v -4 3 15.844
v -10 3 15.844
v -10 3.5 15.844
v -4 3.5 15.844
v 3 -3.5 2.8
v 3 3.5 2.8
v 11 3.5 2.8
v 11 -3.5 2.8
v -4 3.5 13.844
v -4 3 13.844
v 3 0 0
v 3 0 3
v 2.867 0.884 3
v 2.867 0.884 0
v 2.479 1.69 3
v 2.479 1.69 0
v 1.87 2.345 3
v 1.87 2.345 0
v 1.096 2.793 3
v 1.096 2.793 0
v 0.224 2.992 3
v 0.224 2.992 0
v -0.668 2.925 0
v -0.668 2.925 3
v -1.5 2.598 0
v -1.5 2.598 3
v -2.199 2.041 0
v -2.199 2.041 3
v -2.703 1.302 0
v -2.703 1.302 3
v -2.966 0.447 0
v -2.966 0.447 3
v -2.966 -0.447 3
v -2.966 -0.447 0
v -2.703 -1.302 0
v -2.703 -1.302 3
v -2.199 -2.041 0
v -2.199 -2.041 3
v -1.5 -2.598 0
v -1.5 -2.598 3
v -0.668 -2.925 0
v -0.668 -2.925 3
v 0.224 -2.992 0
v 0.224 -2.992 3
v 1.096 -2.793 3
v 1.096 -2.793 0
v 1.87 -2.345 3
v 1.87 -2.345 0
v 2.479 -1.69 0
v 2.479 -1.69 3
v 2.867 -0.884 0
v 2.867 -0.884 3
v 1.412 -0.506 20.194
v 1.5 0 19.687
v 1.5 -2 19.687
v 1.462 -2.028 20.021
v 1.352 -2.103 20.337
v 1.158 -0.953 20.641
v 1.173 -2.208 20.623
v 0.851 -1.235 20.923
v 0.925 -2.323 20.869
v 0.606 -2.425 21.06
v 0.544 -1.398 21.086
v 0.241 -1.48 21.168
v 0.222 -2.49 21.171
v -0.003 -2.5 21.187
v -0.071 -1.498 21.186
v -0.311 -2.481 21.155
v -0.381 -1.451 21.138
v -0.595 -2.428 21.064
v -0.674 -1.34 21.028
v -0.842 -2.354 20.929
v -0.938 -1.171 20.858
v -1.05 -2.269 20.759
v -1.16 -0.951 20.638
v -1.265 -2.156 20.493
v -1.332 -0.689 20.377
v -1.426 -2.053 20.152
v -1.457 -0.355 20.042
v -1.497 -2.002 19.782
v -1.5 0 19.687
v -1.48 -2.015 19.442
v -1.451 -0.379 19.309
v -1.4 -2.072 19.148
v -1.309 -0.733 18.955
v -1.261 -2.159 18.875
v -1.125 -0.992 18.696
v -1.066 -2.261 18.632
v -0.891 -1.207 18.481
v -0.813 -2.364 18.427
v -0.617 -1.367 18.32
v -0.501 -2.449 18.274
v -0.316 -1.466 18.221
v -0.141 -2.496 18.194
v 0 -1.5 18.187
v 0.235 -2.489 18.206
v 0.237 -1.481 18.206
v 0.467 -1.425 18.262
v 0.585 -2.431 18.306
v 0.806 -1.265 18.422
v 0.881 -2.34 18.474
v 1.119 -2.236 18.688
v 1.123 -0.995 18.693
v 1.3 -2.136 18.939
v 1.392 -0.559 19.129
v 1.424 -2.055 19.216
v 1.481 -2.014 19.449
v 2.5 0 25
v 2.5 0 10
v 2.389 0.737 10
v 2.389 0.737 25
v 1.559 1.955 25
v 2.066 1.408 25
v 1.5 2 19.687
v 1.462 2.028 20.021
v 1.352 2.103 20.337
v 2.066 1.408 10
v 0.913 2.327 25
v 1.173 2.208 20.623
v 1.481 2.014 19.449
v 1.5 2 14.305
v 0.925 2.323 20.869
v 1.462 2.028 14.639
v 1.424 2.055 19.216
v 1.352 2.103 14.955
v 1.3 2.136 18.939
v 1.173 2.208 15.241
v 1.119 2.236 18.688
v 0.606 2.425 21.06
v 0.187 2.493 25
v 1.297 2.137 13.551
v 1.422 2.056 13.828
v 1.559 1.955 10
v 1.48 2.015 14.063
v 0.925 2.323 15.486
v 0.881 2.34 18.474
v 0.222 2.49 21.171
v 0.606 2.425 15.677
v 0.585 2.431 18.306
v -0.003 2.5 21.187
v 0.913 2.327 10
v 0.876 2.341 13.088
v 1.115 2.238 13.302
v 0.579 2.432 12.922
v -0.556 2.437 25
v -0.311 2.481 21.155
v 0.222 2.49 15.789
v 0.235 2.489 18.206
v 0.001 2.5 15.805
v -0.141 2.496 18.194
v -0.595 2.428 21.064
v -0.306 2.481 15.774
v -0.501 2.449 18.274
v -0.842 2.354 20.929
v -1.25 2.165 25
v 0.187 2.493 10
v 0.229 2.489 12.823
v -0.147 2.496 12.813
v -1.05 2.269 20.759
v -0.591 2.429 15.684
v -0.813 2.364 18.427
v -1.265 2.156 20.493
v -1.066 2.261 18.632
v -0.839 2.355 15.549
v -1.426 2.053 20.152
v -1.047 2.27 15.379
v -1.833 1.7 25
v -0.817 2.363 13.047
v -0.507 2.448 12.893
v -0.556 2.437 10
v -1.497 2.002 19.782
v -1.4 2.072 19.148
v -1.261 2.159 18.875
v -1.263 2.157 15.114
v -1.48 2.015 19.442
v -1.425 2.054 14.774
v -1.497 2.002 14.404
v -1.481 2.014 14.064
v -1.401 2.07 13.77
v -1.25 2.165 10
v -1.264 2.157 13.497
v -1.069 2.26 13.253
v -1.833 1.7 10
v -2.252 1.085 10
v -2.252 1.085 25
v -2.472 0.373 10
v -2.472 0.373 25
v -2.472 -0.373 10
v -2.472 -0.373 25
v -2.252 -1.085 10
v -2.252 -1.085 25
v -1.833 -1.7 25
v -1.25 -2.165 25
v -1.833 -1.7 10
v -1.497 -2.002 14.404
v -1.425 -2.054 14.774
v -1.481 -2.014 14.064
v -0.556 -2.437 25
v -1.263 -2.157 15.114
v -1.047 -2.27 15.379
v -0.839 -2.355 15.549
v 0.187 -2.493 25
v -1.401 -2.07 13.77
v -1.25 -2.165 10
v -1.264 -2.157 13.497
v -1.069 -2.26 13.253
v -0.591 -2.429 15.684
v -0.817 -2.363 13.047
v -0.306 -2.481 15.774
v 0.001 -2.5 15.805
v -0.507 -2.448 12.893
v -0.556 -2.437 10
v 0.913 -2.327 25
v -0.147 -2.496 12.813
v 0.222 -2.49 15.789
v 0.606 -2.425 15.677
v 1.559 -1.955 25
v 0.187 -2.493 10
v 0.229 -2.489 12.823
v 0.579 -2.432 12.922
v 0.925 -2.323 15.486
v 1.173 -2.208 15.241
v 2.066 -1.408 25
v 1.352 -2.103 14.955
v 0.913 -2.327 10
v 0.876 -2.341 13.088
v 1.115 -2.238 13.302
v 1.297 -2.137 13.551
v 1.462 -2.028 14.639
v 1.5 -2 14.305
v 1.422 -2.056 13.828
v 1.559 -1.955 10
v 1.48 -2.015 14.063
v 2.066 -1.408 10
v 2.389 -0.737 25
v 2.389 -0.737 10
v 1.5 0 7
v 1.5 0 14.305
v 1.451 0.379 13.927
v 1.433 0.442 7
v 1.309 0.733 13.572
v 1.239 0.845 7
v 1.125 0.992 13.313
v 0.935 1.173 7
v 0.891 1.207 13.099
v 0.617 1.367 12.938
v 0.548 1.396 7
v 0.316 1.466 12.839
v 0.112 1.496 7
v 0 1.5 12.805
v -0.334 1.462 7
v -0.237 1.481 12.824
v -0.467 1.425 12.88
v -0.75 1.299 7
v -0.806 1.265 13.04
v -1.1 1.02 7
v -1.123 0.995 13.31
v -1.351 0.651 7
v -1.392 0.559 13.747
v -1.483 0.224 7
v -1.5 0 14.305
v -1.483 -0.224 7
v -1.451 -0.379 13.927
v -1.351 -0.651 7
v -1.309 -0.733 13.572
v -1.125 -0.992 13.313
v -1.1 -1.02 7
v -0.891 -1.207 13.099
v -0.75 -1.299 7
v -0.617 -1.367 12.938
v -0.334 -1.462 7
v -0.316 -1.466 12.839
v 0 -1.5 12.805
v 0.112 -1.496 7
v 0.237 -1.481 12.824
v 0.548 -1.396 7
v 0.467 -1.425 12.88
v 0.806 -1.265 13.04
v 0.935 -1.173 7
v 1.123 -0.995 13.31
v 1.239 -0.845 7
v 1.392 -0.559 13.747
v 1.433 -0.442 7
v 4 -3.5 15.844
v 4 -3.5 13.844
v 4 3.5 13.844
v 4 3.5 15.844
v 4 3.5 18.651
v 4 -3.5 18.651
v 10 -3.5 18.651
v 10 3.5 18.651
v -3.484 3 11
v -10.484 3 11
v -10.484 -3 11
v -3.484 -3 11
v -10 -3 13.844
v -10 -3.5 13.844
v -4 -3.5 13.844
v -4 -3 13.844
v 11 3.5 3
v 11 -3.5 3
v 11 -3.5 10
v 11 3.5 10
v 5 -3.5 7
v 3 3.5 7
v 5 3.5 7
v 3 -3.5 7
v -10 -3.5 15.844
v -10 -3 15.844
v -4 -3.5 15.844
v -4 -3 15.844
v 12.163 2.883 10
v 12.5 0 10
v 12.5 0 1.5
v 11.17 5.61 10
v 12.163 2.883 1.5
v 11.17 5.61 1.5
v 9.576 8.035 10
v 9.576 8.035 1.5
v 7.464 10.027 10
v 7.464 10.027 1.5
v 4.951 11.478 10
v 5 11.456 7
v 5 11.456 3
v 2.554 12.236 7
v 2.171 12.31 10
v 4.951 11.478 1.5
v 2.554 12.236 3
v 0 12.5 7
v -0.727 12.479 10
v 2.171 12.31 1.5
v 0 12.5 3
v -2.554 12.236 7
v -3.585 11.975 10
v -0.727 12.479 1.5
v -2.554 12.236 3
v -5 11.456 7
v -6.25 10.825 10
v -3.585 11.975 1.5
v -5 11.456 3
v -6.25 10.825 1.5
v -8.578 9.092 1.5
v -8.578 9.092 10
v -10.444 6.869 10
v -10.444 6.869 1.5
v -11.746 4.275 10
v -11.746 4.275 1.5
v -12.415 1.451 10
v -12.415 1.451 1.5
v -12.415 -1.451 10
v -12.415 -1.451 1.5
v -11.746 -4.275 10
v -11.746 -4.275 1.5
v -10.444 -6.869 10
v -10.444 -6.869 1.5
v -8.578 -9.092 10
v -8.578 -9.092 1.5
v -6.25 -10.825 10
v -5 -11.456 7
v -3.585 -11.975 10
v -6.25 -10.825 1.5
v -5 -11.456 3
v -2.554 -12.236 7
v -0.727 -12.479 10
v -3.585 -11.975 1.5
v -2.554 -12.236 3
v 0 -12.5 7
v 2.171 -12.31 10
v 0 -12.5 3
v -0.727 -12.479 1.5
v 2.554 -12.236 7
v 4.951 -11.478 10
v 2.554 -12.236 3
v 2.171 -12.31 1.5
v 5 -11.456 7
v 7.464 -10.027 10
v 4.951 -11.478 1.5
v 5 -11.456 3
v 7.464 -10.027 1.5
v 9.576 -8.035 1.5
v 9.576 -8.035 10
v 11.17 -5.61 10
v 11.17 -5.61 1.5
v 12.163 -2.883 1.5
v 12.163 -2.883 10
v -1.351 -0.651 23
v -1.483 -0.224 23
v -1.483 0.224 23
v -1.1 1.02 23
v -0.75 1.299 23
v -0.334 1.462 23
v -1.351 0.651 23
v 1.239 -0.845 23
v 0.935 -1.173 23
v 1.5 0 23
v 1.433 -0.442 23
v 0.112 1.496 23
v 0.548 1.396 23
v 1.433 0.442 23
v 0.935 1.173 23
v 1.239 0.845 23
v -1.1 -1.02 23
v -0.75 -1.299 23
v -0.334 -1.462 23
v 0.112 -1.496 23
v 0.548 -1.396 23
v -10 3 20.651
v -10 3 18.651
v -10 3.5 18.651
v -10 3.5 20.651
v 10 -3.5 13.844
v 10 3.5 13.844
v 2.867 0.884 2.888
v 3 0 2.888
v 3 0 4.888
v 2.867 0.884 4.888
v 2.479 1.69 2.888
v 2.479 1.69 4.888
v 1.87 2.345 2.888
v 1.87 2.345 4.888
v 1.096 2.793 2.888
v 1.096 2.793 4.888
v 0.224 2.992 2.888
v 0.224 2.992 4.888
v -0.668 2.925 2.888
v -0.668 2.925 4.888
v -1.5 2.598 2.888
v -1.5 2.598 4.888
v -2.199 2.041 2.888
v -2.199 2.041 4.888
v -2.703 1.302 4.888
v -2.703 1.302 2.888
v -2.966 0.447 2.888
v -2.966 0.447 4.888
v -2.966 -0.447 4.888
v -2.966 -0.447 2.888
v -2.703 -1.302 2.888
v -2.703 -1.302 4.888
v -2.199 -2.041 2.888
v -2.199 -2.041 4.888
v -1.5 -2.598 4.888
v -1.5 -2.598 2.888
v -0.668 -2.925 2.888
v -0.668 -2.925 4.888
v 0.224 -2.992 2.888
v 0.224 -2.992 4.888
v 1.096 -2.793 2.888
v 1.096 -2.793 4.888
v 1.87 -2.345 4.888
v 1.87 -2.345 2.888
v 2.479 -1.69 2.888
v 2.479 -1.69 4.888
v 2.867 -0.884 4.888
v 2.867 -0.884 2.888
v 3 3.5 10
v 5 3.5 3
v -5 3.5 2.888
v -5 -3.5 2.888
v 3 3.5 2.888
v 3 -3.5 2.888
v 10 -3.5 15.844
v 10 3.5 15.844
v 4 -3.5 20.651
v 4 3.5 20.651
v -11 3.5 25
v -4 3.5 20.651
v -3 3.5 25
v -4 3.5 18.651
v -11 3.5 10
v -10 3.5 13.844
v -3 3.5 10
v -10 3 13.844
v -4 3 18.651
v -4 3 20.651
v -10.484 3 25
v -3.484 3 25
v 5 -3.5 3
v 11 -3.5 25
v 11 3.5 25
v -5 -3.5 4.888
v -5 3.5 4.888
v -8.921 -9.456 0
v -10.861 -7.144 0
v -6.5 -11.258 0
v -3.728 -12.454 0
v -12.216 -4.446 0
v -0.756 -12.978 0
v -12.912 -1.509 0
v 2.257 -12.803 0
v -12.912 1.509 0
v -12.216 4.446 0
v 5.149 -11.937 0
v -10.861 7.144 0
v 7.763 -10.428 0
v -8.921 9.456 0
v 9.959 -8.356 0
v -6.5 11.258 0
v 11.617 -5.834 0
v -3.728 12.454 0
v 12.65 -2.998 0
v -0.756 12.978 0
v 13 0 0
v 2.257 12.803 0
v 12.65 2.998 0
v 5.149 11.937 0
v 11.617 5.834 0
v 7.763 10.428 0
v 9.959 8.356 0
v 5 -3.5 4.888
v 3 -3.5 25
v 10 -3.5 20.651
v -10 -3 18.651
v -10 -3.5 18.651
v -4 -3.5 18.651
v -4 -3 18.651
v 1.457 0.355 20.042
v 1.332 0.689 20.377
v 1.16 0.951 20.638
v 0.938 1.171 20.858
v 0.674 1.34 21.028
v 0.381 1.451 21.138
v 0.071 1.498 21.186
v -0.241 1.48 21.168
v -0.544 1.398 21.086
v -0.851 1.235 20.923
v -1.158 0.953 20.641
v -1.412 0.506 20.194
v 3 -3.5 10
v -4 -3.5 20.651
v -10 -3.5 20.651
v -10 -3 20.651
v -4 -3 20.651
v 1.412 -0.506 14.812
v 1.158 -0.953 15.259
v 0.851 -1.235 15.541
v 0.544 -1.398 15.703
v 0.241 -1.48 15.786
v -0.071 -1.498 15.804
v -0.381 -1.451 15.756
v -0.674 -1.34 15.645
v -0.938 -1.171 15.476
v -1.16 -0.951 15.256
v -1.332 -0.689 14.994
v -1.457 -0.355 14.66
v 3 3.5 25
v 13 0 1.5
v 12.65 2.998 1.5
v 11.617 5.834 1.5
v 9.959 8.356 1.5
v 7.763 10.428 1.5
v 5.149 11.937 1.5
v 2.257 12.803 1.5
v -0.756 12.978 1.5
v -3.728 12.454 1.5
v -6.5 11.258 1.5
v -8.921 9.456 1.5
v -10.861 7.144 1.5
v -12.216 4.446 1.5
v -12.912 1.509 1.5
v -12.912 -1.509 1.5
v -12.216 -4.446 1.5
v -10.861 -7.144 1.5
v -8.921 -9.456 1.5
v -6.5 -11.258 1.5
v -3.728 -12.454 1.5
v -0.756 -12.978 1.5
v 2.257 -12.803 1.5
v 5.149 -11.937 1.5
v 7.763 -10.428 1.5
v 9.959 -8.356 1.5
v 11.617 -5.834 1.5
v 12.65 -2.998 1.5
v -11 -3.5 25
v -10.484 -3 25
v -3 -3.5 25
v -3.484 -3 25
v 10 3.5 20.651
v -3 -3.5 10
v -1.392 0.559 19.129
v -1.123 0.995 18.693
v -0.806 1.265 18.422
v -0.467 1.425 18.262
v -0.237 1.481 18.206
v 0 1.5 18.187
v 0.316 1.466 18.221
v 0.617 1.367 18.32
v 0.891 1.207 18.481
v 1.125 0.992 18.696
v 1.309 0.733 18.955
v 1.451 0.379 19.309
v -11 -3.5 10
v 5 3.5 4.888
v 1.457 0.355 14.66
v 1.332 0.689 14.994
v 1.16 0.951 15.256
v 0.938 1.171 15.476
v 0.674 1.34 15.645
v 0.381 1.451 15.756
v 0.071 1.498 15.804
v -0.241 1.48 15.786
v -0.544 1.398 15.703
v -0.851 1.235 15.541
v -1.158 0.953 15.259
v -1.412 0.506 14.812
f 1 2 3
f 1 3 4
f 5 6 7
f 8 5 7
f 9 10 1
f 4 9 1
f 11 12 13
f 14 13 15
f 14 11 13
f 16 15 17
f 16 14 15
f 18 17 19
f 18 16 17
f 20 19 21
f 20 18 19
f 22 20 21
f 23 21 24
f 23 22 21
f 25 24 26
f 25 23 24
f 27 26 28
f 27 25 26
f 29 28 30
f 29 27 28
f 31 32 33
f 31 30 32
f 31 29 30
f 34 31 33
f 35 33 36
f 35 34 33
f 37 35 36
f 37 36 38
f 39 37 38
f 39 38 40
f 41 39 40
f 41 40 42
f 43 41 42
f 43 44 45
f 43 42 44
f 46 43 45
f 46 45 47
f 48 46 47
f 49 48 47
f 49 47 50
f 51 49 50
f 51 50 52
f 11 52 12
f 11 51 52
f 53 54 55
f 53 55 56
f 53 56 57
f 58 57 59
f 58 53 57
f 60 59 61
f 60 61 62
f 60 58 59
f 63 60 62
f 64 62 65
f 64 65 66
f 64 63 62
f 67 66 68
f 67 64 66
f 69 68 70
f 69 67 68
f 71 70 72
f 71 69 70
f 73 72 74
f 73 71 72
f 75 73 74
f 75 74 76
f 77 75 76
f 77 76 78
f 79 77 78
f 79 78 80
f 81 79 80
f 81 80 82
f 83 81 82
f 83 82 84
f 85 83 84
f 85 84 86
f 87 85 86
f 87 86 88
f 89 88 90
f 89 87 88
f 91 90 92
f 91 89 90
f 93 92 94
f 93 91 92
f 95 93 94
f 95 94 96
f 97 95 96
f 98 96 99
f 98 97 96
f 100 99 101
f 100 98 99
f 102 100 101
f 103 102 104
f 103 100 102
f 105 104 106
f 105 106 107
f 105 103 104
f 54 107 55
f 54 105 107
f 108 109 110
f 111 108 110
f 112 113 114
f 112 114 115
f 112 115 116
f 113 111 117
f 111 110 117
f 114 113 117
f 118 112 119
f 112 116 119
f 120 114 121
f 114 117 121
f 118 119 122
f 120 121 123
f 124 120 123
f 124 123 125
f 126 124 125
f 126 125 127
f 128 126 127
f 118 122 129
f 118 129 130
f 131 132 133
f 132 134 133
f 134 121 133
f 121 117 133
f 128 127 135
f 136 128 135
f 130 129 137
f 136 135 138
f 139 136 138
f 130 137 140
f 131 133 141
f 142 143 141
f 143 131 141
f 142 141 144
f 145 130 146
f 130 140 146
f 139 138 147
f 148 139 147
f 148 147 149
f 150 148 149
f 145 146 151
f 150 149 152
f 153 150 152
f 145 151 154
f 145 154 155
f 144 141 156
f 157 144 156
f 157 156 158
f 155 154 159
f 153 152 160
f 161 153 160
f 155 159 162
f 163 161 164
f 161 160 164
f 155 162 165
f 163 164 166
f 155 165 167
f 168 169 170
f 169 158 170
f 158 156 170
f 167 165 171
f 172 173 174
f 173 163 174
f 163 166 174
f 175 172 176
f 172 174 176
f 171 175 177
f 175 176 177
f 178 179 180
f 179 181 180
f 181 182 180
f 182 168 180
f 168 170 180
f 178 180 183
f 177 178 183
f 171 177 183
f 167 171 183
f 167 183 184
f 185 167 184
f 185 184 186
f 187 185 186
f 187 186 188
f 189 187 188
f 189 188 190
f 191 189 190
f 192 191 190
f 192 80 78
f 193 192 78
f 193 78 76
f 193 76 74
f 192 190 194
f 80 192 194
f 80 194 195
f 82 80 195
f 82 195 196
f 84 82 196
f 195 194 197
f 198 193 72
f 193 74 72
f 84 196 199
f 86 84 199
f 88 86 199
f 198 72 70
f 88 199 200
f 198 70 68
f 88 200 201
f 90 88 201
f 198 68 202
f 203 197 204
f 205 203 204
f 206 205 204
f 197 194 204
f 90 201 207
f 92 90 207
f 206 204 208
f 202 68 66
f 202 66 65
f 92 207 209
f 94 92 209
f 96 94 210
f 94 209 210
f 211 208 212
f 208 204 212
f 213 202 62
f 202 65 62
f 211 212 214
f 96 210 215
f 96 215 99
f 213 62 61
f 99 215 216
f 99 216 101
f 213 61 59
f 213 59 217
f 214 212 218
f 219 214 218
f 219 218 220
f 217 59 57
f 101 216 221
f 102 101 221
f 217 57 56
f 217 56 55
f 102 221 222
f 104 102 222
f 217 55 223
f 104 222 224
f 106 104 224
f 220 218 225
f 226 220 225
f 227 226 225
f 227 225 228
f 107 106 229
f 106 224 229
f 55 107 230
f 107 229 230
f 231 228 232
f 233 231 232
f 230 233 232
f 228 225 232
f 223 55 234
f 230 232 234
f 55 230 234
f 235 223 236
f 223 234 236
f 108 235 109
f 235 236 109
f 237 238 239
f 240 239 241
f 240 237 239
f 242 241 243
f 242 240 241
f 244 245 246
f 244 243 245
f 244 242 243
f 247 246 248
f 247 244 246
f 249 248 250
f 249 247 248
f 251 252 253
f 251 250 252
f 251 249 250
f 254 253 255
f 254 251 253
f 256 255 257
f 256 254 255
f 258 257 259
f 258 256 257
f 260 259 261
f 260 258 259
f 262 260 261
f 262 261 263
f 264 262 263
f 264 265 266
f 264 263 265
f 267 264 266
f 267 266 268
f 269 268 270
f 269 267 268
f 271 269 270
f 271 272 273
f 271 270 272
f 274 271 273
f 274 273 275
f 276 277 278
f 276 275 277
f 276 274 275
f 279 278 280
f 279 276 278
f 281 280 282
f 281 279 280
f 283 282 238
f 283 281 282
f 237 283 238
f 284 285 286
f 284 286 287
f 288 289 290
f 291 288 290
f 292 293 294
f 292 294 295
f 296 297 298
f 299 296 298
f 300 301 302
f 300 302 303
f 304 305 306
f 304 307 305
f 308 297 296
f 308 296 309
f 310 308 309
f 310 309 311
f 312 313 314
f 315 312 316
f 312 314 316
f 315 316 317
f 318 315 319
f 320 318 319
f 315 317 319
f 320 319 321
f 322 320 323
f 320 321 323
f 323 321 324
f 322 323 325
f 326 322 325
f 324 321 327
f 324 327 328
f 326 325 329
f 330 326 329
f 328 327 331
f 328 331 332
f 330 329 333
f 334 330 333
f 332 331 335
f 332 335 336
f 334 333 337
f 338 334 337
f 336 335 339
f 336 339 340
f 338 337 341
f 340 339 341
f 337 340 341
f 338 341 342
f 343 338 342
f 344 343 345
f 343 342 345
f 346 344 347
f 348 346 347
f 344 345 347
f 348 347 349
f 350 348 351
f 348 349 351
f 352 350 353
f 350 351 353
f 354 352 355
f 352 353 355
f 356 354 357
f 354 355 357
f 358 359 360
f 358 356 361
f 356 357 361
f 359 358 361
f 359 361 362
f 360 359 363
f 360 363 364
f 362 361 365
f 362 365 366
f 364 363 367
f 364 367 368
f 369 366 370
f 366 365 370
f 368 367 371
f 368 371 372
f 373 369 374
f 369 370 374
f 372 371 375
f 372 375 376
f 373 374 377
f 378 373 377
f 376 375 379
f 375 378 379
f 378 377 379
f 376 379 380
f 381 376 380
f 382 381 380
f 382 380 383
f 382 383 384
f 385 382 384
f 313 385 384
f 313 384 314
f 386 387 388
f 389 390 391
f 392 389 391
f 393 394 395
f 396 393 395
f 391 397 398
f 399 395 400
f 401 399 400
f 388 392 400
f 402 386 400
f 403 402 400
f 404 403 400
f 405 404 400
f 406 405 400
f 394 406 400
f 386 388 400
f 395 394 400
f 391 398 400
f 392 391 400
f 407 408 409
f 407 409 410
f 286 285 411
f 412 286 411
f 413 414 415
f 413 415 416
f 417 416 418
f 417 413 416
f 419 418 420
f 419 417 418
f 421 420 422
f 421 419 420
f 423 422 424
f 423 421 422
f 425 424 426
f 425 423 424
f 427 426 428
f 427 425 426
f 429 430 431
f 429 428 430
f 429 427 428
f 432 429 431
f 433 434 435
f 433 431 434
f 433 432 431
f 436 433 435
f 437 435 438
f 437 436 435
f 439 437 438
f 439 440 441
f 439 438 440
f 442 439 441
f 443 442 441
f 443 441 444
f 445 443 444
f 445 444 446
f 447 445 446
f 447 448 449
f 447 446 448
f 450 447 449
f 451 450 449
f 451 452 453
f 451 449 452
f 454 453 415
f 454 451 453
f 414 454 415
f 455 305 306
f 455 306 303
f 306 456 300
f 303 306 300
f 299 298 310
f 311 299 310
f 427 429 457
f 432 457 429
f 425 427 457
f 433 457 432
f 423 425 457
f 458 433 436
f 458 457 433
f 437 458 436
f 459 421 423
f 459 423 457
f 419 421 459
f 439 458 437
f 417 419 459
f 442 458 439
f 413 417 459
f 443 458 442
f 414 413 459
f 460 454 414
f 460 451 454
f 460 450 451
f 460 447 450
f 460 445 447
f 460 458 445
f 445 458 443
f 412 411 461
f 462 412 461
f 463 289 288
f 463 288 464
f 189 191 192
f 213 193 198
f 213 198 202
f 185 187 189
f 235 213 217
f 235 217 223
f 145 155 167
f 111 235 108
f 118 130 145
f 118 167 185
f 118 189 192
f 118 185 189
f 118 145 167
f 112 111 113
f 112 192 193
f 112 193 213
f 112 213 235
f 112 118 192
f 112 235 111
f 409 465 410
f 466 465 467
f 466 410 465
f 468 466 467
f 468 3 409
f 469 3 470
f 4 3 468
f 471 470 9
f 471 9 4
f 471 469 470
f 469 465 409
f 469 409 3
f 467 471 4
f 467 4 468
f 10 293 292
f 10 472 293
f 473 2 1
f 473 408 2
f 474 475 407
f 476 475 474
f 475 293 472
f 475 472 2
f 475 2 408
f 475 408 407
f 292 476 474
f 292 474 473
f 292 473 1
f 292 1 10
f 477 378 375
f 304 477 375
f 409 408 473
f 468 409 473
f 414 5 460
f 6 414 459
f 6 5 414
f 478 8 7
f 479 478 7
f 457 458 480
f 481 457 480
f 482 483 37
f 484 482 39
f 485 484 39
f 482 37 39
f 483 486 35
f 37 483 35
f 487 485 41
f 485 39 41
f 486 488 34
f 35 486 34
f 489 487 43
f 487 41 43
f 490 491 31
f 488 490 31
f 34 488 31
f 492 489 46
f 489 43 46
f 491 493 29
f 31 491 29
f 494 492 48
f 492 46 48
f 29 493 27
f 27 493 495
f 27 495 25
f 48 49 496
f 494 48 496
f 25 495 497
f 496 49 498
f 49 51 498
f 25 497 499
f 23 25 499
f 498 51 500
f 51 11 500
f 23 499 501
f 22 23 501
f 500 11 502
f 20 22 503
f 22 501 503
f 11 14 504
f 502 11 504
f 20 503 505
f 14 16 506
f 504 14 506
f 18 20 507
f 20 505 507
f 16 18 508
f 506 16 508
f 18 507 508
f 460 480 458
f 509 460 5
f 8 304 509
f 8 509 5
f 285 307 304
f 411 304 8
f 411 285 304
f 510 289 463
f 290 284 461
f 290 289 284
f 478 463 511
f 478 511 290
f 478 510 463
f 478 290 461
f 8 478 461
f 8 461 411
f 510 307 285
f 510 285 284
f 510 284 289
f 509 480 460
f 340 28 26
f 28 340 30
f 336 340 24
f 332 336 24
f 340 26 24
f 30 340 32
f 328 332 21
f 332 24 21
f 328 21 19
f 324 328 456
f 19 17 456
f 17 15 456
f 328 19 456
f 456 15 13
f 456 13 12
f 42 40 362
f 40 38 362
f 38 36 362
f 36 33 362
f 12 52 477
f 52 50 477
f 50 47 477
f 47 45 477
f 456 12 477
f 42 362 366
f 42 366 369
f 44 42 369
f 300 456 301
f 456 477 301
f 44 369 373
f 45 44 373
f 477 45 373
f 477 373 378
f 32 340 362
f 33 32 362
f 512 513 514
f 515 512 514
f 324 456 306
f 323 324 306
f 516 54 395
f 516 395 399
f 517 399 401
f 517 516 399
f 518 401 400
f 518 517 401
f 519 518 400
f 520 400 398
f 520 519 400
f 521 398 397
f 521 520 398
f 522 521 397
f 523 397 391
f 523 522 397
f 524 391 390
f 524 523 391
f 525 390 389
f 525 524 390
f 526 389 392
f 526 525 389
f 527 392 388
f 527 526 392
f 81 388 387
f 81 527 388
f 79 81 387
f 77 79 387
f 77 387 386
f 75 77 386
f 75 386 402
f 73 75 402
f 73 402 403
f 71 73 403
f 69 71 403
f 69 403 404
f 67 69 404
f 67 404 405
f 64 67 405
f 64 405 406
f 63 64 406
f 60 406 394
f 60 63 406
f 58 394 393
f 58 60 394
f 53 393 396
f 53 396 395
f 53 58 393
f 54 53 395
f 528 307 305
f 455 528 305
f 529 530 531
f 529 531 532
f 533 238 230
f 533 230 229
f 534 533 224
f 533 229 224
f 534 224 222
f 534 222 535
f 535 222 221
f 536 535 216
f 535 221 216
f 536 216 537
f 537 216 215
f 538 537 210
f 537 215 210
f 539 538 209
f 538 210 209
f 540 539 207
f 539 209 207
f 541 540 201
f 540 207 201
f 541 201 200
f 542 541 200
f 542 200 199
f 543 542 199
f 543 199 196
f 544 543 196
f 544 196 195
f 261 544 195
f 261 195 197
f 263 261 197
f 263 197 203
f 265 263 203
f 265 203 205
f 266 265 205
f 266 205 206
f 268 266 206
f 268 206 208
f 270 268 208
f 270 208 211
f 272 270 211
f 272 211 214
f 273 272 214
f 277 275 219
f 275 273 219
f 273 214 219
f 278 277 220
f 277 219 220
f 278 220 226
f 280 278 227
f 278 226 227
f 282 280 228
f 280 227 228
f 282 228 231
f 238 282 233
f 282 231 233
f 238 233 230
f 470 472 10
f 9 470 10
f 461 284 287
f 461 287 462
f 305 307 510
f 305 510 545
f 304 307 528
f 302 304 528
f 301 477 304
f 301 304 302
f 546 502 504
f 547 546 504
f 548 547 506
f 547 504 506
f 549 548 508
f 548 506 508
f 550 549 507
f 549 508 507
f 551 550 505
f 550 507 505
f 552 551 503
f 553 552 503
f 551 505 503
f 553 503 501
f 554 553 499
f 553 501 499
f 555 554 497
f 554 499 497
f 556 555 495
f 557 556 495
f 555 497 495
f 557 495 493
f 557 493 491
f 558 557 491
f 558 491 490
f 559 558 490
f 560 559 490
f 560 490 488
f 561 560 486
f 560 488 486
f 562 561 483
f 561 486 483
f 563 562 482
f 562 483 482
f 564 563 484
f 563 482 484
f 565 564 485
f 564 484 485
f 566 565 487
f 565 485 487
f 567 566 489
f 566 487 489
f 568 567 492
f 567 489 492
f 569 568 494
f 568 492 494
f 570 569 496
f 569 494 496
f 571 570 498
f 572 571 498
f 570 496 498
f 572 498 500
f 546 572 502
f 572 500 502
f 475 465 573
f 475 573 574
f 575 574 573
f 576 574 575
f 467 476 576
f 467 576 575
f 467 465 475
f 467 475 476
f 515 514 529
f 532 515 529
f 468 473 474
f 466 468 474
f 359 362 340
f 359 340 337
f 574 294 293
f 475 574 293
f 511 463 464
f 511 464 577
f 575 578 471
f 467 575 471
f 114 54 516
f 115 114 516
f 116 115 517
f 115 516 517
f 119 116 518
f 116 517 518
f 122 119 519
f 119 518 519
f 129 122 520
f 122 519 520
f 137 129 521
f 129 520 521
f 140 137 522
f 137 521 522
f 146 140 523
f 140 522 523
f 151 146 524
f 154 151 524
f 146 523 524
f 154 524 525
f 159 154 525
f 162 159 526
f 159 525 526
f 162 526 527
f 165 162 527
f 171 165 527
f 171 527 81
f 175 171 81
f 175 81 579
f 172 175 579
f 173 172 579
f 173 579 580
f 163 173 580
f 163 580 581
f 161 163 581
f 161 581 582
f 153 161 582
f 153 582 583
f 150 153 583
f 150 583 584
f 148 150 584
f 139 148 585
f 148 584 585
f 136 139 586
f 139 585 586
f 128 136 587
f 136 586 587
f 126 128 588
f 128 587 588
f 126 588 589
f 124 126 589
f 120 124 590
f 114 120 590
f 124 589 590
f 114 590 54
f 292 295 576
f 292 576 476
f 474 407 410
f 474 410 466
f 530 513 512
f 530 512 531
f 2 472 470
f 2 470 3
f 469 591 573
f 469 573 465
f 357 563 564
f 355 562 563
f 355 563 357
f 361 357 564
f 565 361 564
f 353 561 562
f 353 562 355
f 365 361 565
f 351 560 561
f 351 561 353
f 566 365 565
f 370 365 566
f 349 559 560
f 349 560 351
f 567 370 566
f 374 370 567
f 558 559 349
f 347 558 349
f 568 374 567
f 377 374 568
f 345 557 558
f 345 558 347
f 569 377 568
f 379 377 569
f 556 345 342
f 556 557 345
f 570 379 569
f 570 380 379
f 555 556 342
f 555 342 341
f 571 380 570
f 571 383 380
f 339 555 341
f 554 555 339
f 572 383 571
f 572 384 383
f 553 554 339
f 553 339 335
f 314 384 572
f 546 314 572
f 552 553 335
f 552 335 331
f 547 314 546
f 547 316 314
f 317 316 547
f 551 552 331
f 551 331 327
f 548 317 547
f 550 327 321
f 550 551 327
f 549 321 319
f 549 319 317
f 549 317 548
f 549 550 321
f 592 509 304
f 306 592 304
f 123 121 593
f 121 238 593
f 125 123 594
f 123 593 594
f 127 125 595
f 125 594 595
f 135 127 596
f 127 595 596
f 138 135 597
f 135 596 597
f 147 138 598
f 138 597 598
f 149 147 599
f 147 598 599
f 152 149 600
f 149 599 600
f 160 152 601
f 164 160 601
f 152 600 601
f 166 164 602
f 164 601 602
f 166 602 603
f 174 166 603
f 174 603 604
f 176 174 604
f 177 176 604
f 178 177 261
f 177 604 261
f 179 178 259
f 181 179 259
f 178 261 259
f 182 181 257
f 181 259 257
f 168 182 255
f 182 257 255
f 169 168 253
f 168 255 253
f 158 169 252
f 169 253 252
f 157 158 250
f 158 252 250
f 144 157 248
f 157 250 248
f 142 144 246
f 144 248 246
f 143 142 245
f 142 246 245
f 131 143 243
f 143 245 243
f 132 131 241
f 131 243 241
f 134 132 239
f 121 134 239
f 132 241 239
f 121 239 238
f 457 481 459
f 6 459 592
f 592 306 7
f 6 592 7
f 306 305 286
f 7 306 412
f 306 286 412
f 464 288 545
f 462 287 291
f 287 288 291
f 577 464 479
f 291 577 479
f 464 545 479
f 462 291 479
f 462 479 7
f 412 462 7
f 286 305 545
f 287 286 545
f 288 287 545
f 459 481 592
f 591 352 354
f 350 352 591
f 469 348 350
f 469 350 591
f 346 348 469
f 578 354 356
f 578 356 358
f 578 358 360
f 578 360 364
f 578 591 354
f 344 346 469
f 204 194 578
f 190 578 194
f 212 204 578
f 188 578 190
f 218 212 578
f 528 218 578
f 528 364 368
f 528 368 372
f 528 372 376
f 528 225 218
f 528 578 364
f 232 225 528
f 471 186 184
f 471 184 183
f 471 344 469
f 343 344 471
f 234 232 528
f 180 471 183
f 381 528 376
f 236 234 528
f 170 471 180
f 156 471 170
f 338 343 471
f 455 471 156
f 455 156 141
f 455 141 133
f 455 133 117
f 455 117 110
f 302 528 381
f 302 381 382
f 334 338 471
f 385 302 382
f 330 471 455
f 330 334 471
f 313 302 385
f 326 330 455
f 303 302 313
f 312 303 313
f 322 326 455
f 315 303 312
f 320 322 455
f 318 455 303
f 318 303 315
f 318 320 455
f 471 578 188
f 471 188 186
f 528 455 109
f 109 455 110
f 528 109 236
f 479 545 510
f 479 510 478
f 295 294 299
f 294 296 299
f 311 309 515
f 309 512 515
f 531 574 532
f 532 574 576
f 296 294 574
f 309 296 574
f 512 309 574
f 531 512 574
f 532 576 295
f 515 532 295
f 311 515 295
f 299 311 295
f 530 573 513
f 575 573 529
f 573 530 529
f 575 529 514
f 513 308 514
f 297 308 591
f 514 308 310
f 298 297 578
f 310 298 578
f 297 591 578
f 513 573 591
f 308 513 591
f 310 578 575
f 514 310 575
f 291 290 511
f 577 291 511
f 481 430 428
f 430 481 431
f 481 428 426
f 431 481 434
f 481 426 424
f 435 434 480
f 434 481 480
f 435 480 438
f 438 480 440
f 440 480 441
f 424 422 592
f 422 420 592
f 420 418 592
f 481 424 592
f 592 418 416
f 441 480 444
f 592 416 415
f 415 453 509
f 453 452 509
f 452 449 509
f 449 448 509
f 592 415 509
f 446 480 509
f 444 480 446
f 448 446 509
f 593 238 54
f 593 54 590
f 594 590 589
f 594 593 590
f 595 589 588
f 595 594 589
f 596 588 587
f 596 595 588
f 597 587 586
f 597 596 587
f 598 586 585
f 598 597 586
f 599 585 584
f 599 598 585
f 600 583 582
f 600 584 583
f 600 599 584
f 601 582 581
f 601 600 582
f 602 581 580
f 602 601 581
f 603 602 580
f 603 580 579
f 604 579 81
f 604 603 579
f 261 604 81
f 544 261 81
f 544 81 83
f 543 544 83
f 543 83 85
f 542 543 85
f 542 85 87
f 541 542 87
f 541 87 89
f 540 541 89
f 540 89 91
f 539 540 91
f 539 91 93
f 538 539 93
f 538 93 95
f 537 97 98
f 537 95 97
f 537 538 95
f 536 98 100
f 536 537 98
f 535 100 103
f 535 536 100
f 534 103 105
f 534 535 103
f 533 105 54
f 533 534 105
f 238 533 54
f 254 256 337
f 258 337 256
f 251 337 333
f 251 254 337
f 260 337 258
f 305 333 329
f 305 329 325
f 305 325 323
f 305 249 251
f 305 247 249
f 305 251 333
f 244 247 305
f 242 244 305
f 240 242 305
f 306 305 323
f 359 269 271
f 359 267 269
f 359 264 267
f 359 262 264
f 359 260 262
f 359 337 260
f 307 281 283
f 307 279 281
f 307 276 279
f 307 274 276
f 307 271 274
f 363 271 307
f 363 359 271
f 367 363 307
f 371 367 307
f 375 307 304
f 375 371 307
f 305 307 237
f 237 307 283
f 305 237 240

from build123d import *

# Parameters (mm, degrees)
F0_R      = 13
F2_DEPTH  = 1.5
F1_R      = 12.5
F3_DEPTH  = 10
F4_R      = 2.5
F5_DEPTH  = 25
F7_START  = 4
F6_R      = 1.5
F7_DEPTH  = 19
F8_R      = 1.5
F9_DEPTH  = 5.1
F10_W     = 8
F10_H     = 7
F11_DEPTH = 25
F13_W     = 7
F13_H     = 6
F14_DEPTH = 14
F16_START = 3
F15_W     = 8
F15_H     = 7
F16_DEPTH = 22
F18_START = 2.8
F17_W     = 8
F17_H     = 7
F18_DEPTH = 22.2
F19_W     = 10
F19_H     = 4
F20_DEPTH = 14
F21_W     = 10
F21_H     = 2
F22_DEPTH = 3.5
F23_R     = 3
F24_DEPTH = 5.2
F26_W     = 6
F26_H     = 2
F27_DEPTH = 9


with BuildPart() as f2:
    # F0 (on Top) → F2 (new body)
    with BuildSketch(Plane.XY):
        Circle(F0_R)
    extrude(amount=F2_DEPTH)

    # F1 (on Top) → F3 (join)
    with BuildSketch(Plane.XY):
        Circle(F1_R)
    extrude(amount=F3_DEPTH)

    # F4 (on Top) → F5 (join)
    with BuildSketch(Plane.XY):
        Circle(F4_R)
    extrude(amount=F5_DEPTH)

    # F6 (on Top) → F7 (cut)
    with BuildSketch(Plane.XY.offset(F7_START)):
        Circle(F6_R)
    extrude(amount=F7_DEPTH, mode=Mode.SUBTRACT)

    # F8 (on Front) → F9 (cut, symmetric)
    with BuildSketch(Plane.XZ):
        with Locations((0, 19.687499851)):
            Circle(F8_R)
        with Locations((0, 14.3053065985)):
            Circle(F8_R)
    extrude(amount=F9_DEPTH, both=True, mode=Mode.SUBTRACT)

    # F10 (on Top) → F11 (join)
    with BuildSketch(Plane.XY):
        with Locations((-7, 0)):
            Rectangle(F10_W, F10_H)
    extrude(amount=F11_DEPTH)

    # F13 (on offset) → F14 (cut)
    with BuildSketch(Plane.XY.offset(25)):
        with Locations((-6.9841630757, 0)):
            Rectangle(F13_W, F13_H)
    extrude(amount=-F14_DEPTH, mode=Mode.SUBTRACT)

    # F15 (on Top) → F16 (cut)
    with BuildSketch(Plane.XY.offset(F16_START)):
        with Locations((7, 0)):
            Rectangle(F15_W, F15_H)
    extrude(amount=F16_DEPTH, mode=Mode.SUBTRACT)


with BuildPart() as f18:
    # F17 (on Top) → F18 (new body)
    with BuildSketch(Plane.XY.offset(F18_START)):
        with Locations((7, 0)):
            Rectangle(F17_W, F17_H)
    extrude(amount=F18_DEPTH)


with BuildPart() as f20_tool:
    # F19 (on Front) → F20 (new body, symmetric)
    with BuildSketch(Plane.XZ):
        with Locations((0, 5)):
            Rectangle(F19_W, F19_H)
    extrude(amount=F20_DEPTH, both=True)


with BuildPart() as f2_1:
    add(f2.part)

    # F20: cut by f20_tool
    add(f20_tool.part, mode=Mode.SUBTRACT)


with BuildPart() as f18_1:
    add(f18.part)

    # F20: cut by f20_tool
    add(f20_tool.part, mode=Mode.SUBTRACT)

    # F21 (on Front) → F22 (join, symmetric)
    with BuildSketch(Plane.XZ):
        with Locations((0, 3.8880447391)):
            Rectangle(F21_W, F21_H)
    extrude(amount=F22_DEPTH, both=True)


with BuildPart() as f24_tool:
    # F23 (on Top) → F24 (new body)
    with BuildSketch(Plane.XY):
        Circle(F23_R)
    extrude(amount=F24_DEPTH)


with BuildPart() as f2_2:
    add(f2_1.part)

    # F24: cut by f24_tool
    add(f24_tool.part, mode=Mode.SUBTRACT)


with BuildPart() as f18_2:
    add(f18_1.part)

    # F24: cut by f24_tool
    add(f24_tool.part, mode=Mode.SUBTRACT)


with BuildPart() as f27_tool:
    # F26 (on offset) → F27 (new body)
    with BuildSketch(Plane.XZ.offset(4.5)):
        with Locations((-7, 19.6511967331)):
            Rectangle(F26_W, F26_H)
        with Locations((-7, 14.8438874856)):
            Rectangle(F26_W, F26_H)
        with Locations((7, 19.6511967331)):
            Rectangle(F26_W, F26_H)
        with Locations((7, 14.8438874856)):
            Rectangle(F26_W, F26_H)
    extrude(amount=-F27_DEPTH)


with BuildPart() as f2_3:
    add(f2_2.part)

    # F27: cut by f27_tool
    add(f27_tool.part, mode=Mode.SUBTRACT)


with BuildPart() as f18_3:
    add(f18_2.part)

    # F27: cut by f27_tool
    add(f27_tool.part, mode=Mode.SUBTRACT)


solid = Compound([f2_3.part, f18_3.part])
